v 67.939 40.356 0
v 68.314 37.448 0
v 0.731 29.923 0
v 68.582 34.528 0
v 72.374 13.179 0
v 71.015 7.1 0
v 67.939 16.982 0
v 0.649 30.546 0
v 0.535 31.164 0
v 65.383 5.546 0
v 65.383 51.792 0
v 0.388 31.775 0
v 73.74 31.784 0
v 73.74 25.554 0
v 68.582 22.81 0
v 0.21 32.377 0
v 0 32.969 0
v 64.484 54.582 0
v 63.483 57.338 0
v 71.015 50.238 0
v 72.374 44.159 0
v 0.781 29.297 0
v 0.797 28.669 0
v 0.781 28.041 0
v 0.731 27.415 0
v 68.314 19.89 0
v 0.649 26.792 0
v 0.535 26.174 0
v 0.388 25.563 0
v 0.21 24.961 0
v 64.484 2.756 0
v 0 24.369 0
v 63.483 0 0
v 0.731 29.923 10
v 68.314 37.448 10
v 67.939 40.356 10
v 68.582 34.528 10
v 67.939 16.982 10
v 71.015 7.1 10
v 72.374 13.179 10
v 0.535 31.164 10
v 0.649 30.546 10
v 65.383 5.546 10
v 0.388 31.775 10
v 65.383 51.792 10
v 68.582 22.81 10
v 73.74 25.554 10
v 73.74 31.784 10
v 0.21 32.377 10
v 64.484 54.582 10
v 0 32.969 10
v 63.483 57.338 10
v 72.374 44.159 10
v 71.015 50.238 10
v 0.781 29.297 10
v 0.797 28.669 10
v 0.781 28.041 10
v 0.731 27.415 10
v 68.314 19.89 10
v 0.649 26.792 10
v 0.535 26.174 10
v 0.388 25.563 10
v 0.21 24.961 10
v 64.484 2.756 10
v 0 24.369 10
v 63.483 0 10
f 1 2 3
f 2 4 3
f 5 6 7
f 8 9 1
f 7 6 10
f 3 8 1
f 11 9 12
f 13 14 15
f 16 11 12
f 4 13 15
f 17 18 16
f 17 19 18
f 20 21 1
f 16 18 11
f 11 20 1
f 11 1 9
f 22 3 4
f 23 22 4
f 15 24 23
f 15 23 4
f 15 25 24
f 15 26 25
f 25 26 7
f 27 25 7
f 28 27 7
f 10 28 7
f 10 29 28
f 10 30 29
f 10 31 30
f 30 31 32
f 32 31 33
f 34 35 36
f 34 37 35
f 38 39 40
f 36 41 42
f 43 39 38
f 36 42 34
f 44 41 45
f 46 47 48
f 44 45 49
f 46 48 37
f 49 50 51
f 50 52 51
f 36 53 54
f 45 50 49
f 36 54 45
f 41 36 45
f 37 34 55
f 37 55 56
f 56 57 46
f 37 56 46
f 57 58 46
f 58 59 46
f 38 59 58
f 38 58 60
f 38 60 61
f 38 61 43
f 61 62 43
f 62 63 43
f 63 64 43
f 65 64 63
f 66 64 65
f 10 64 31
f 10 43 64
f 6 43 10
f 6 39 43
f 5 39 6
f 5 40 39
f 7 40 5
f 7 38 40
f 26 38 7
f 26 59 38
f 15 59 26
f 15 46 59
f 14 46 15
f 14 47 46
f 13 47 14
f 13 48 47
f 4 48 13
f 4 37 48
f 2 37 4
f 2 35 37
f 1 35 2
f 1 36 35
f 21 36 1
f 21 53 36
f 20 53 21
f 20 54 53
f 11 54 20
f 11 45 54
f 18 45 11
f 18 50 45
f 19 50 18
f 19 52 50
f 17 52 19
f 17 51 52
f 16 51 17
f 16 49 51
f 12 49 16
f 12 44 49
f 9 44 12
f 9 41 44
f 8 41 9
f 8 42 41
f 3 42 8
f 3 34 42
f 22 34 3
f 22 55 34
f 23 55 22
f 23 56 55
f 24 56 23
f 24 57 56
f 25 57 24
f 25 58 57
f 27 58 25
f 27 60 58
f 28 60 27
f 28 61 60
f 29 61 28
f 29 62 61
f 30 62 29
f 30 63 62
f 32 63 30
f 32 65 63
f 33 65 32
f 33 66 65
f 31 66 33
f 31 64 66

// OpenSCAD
$fn = 32;

// ----------------------------------------------------------------------
// Gear sector: 3 teeth on 42 degrees
// ----------------------------------------------------------------------

// --- parameters (mm) ---
sector_angle = 42;        // sector angle, degrees
root_r = 80;              // root circle radius
tooth_h = 5;              // tooth height over the root circle
teeth = 3;                // number of teeth on the sector
hub_r = 12;               // hub bore radius
plate_t = 10;             // sector thickness, Z
arc_step = 3;             // sampling step of the root/hub arcs, degrees
fit_tol = 0.05;           // declared fit tolerance (prompt contract)
free_tol = 0.2;           // declared free tolerance (prompt contract)

tip_r = root_r + tooth_h;  // tip circle radius

profile = [[63.483, 0], [64.484, 2.756], [65.383, 5.546], [71.015, 7.1], [72.374, 13.179], [67.939, 16.982], [68.314, 19.89], [68.582, 22.81], [73.74, 25.554], [73.74, 31.784], [68.582, 34.528], [68.314, 37.448], [67.939, 40.356], [72.374, 44.159], [71.015, 50.238], [65.383, 51.792], [64.484, 54.582], [63.483, 57.338], [0, 32.969], [0.21, 32.377], [0.388, 31.775], [0.535, 31.164], [0.649, 30.546], [0.731, 29.923], [0.781, 29.297], [0.797, 28.669], [0.781, 28.041], [0.731, 27.415], [0.649, 26.792], [0.535, 26.174], [0.388, 25.563], [0.21, 24.961], [0, 24.369]];  // primary outline, 33 points, counter clockwise

// --- the one profile operation ---
linear_extrude(height = plate_t) polygon(points = profile);
